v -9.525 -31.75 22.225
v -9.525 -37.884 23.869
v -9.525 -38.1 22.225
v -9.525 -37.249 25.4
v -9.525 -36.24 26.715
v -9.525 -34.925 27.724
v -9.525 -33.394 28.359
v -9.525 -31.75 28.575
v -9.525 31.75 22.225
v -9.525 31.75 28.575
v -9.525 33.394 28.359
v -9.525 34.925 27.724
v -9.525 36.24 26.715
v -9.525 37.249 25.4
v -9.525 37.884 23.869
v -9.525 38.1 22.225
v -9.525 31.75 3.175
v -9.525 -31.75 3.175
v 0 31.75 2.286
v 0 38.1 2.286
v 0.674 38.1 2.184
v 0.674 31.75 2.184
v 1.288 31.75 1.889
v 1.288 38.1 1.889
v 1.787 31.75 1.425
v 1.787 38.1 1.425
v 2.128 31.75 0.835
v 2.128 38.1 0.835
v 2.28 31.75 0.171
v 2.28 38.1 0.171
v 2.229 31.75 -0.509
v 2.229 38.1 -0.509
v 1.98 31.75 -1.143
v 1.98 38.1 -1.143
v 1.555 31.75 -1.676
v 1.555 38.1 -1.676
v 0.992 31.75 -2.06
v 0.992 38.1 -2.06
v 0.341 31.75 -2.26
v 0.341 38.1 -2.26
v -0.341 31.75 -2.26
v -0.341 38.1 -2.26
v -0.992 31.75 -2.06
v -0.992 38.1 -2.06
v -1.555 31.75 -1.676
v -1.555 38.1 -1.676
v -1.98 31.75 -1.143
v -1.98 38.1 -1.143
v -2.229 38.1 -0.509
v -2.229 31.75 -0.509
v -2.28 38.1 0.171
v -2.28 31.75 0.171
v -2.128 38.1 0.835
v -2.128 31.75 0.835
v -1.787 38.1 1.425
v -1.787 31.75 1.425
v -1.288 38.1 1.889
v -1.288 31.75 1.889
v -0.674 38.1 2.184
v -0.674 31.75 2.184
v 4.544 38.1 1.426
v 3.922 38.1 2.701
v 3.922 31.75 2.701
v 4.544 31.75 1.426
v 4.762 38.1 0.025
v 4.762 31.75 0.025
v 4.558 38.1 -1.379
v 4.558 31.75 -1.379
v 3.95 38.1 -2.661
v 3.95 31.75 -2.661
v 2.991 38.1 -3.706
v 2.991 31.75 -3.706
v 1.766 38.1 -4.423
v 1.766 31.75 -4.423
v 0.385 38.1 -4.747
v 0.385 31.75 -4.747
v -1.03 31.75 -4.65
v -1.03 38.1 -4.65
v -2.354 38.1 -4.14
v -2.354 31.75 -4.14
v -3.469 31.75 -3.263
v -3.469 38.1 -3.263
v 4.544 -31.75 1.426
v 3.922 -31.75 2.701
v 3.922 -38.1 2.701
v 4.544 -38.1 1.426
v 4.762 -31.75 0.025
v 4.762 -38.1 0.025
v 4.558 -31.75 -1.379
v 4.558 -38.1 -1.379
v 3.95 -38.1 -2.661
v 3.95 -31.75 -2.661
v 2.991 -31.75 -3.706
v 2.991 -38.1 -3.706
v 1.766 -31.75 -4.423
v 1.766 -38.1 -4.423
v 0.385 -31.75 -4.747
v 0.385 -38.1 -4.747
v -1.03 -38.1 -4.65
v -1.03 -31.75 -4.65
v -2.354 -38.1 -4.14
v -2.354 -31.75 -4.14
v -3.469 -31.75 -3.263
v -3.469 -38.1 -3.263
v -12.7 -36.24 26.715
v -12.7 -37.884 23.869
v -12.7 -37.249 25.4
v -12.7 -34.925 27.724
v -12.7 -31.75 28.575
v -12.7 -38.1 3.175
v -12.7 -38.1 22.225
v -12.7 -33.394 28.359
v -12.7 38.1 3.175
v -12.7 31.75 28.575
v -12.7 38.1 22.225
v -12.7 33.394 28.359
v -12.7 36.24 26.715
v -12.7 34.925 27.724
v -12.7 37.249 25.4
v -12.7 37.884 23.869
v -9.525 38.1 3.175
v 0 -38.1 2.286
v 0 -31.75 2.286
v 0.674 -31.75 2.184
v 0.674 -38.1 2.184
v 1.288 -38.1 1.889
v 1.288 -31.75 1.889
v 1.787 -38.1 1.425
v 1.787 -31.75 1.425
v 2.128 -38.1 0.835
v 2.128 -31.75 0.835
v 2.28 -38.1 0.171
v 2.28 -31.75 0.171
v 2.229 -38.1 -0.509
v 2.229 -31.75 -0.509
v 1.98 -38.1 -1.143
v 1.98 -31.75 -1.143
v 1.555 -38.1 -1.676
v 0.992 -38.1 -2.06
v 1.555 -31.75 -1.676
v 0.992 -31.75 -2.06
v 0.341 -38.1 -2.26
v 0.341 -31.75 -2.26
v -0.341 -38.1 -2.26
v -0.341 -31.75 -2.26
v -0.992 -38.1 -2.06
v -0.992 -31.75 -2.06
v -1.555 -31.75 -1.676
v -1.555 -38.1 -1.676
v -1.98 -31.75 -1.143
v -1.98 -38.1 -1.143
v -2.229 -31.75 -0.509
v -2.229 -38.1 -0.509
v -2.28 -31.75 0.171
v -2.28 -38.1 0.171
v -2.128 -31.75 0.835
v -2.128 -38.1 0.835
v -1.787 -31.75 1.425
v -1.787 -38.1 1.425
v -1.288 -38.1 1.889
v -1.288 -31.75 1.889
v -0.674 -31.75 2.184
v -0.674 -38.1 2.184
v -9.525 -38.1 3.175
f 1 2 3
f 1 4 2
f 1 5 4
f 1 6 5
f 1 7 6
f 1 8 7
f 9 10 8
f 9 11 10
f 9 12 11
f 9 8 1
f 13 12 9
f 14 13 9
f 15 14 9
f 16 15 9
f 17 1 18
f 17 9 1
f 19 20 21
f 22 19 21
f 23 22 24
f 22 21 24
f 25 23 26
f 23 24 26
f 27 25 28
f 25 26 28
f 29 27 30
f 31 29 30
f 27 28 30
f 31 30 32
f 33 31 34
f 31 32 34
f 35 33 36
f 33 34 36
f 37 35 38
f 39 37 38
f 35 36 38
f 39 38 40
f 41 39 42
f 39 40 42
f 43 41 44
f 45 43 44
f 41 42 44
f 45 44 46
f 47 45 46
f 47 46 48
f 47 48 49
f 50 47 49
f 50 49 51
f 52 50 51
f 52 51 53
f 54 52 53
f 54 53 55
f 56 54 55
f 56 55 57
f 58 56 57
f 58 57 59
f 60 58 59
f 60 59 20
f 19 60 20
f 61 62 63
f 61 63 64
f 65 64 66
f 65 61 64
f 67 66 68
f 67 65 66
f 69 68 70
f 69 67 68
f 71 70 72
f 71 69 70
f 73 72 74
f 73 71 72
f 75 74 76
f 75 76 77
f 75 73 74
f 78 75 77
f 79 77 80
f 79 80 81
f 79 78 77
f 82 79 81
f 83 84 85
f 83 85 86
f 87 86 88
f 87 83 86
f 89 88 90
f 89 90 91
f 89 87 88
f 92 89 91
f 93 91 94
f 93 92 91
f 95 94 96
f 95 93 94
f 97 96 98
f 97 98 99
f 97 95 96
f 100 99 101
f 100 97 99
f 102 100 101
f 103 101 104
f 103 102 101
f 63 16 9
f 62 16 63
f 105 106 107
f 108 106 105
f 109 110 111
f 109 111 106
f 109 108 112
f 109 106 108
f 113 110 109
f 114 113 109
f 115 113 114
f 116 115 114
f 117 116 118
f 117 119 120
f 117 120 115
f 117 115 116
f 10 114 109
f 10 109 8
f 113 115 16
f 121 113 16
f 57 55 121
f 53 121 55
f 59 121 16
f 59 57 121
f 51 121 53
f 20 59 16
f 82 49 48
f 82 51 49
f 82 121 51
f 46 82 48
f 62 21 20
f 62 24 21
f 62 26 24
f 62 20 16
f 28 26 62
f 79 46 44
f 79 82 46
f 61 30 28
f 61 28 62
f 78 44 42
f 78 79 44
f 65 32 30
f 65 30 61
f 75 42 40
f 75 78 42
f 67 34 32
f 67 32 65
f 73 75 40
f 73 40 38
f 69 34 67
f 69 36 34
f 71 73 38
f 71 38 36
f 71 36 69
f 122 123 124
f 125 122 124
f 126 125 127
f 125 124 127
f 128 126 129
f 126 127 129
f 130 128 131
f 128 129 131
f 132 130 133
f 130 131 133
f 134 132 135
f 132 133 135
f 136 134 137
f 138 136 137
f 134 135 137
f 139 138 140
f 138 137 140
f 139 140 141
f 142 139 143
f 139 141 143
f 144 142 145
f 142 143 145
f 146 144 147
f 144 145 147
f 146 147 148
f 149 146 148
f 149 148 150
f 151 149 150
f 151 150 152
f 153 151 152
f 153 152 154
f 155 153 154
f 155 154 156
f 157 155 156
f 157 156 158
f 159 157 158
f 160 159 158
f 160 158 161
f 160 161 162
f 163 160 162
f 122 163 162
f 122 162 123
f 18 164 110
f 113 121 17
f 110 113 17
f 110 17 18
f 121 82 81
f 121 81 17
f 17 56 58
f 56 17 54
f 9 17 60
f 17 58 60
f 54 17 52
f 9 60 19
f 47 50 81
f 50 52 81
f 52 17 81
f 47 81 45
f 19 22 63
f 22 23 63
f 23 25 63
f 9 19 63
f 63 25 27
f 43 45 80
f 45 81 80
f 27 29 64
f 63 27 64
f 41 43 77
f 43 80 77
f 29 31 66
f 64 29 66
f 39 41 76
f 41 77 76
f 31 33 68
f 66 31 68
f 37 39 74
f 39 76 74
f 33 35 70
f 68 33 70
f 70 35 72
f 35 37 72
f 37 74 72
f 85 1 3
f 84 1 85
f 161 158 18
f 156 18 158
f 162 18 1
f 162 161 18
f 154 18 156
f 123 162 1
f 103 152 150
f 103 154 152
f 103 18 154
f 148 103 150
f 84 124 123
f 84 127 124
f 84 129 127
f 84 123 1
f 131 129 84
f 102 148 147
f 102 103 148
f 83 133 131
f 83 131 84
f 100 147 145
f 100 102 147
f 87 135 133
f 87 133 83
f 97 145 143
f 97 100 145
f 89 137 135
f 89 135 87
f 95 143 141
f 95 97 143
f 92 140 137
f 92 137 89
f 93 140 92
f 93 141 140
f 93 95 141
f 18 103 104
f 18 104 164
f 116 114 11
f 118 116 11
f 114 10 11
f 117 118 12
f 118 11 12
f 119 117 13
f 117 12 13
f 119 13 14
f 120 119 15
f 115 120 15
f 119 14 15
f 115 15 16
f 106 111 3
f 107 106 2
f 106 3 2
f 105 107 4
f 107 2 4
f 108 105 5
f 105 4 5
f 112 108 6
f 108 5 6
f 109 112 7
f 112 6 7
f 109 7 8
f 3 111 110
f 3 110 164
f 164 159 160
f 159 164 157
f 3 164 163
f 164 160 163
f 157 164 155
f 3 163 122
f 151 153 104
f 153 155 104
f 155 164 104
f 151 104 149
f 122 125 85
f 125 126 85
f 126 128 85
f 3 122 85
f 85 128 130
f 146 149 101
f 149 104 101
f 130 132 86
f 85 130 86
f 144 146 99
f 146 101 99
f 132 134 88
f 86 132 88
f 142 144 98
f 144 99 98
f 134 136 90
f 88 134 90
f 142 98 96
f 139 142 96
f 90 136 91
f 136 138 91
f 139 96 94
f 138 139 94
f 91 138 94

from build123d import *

# Parameters (mm, degrees)
BOSS_EXTRUDE1_DEPTH     = 38.1
CUT_EXTRUDE1_DEPTH      = 31.75
CUT_EXTRUDE1_DEPTH_BACK = 31.75
FILLET1_R               = 6.35
SKETCH3_R               = 2.286
CUT_EXTRUDE2_DEPTH      = 83.366623246


with BuildPart() as part:
    # Sketch1 → Boss-Extrude1 (new, symmetric)
    with BuildSketch(Plane(origin=(0, 0, 0), x_dir=(1, 0, 0), z_dir=(0, 1, 0))):
        with BuildLine():
            Line((-12.7, -3.175), (-12.7, -28.575))
            Line((-12.7, -28.575), (-9.525, -28.575))
            Line((-9.525, -28.575), (-9.525, -22.225))
            Line((-9.525, -22.225), (3.922177061, -2.70146874))
            ThreePointArc((3.922177061, -2.70146874), (2.990880149, 3.706216694), (-3.468948889, 3.263096667))
            Line((-3.468948889, 3.263096667), (-9.525, -3.175))
            Line((-9.525, -3.175), (-12.7, -3.175))
        make_face()
    extrude(amount=BOSS_EXTRUDE1_DEPTH, both=True)

    # Sketch2 → Cut-Extrude1 (cut, two sides: drawn at the far end of the back side and taken through both)
    with BuildSketch(Plane(origin=(0, 0, 0), x_dir=(1, 0, 0), z_dir=(0, 1, 0)).offset(-CUT_EXTRUDE1_DEPTH_BACK)):
        with BuildLine():
            Line((-3.468948889, 3.263096667), (-9.525, -3.175))
            Line((-9.525, -3.175), (-9.525, -22.225))
            Line((-9.525, -22.225), (3.922177061, -2.70146874))
            ThreePointArc((3.922177061, -2.70146874), (2.990880149, 3.706216694), (-3.468948889, 3.263096667))
        make_face()
    extrude(amount=CUT_EXTRUDE1_DEPTH + CUT_EXTRUDE1_DEPTH_BACK, mode=Mode.SUBTRACT)

    # Fillet1
    fillet1_edges = [part.edges().sort_by_distance(p)[0] for p in [
        (-11.1125, -38.1, 28.575),
        (-11.1125, 38.1, 28.575),
    ]]
    fillet(fillet1_edges, radius=FILLET1_R)

    # Sketch3 → Cut-Extrude2 (cut, through all)
    with BuildSketch(Plane(origin=(0, 38.1, 0), x_dir=(1, 0, 0), z_dir=(0, 1, 0))):
        with Locations(Location((0, 0, 0), (0, 0, 270))):
            Circle(SKETCH3_R)
    extrude(amount=-CUT_EXTRUDE2_DEPTH, mode=Mode.SUBTRACT)


solid = part.part
